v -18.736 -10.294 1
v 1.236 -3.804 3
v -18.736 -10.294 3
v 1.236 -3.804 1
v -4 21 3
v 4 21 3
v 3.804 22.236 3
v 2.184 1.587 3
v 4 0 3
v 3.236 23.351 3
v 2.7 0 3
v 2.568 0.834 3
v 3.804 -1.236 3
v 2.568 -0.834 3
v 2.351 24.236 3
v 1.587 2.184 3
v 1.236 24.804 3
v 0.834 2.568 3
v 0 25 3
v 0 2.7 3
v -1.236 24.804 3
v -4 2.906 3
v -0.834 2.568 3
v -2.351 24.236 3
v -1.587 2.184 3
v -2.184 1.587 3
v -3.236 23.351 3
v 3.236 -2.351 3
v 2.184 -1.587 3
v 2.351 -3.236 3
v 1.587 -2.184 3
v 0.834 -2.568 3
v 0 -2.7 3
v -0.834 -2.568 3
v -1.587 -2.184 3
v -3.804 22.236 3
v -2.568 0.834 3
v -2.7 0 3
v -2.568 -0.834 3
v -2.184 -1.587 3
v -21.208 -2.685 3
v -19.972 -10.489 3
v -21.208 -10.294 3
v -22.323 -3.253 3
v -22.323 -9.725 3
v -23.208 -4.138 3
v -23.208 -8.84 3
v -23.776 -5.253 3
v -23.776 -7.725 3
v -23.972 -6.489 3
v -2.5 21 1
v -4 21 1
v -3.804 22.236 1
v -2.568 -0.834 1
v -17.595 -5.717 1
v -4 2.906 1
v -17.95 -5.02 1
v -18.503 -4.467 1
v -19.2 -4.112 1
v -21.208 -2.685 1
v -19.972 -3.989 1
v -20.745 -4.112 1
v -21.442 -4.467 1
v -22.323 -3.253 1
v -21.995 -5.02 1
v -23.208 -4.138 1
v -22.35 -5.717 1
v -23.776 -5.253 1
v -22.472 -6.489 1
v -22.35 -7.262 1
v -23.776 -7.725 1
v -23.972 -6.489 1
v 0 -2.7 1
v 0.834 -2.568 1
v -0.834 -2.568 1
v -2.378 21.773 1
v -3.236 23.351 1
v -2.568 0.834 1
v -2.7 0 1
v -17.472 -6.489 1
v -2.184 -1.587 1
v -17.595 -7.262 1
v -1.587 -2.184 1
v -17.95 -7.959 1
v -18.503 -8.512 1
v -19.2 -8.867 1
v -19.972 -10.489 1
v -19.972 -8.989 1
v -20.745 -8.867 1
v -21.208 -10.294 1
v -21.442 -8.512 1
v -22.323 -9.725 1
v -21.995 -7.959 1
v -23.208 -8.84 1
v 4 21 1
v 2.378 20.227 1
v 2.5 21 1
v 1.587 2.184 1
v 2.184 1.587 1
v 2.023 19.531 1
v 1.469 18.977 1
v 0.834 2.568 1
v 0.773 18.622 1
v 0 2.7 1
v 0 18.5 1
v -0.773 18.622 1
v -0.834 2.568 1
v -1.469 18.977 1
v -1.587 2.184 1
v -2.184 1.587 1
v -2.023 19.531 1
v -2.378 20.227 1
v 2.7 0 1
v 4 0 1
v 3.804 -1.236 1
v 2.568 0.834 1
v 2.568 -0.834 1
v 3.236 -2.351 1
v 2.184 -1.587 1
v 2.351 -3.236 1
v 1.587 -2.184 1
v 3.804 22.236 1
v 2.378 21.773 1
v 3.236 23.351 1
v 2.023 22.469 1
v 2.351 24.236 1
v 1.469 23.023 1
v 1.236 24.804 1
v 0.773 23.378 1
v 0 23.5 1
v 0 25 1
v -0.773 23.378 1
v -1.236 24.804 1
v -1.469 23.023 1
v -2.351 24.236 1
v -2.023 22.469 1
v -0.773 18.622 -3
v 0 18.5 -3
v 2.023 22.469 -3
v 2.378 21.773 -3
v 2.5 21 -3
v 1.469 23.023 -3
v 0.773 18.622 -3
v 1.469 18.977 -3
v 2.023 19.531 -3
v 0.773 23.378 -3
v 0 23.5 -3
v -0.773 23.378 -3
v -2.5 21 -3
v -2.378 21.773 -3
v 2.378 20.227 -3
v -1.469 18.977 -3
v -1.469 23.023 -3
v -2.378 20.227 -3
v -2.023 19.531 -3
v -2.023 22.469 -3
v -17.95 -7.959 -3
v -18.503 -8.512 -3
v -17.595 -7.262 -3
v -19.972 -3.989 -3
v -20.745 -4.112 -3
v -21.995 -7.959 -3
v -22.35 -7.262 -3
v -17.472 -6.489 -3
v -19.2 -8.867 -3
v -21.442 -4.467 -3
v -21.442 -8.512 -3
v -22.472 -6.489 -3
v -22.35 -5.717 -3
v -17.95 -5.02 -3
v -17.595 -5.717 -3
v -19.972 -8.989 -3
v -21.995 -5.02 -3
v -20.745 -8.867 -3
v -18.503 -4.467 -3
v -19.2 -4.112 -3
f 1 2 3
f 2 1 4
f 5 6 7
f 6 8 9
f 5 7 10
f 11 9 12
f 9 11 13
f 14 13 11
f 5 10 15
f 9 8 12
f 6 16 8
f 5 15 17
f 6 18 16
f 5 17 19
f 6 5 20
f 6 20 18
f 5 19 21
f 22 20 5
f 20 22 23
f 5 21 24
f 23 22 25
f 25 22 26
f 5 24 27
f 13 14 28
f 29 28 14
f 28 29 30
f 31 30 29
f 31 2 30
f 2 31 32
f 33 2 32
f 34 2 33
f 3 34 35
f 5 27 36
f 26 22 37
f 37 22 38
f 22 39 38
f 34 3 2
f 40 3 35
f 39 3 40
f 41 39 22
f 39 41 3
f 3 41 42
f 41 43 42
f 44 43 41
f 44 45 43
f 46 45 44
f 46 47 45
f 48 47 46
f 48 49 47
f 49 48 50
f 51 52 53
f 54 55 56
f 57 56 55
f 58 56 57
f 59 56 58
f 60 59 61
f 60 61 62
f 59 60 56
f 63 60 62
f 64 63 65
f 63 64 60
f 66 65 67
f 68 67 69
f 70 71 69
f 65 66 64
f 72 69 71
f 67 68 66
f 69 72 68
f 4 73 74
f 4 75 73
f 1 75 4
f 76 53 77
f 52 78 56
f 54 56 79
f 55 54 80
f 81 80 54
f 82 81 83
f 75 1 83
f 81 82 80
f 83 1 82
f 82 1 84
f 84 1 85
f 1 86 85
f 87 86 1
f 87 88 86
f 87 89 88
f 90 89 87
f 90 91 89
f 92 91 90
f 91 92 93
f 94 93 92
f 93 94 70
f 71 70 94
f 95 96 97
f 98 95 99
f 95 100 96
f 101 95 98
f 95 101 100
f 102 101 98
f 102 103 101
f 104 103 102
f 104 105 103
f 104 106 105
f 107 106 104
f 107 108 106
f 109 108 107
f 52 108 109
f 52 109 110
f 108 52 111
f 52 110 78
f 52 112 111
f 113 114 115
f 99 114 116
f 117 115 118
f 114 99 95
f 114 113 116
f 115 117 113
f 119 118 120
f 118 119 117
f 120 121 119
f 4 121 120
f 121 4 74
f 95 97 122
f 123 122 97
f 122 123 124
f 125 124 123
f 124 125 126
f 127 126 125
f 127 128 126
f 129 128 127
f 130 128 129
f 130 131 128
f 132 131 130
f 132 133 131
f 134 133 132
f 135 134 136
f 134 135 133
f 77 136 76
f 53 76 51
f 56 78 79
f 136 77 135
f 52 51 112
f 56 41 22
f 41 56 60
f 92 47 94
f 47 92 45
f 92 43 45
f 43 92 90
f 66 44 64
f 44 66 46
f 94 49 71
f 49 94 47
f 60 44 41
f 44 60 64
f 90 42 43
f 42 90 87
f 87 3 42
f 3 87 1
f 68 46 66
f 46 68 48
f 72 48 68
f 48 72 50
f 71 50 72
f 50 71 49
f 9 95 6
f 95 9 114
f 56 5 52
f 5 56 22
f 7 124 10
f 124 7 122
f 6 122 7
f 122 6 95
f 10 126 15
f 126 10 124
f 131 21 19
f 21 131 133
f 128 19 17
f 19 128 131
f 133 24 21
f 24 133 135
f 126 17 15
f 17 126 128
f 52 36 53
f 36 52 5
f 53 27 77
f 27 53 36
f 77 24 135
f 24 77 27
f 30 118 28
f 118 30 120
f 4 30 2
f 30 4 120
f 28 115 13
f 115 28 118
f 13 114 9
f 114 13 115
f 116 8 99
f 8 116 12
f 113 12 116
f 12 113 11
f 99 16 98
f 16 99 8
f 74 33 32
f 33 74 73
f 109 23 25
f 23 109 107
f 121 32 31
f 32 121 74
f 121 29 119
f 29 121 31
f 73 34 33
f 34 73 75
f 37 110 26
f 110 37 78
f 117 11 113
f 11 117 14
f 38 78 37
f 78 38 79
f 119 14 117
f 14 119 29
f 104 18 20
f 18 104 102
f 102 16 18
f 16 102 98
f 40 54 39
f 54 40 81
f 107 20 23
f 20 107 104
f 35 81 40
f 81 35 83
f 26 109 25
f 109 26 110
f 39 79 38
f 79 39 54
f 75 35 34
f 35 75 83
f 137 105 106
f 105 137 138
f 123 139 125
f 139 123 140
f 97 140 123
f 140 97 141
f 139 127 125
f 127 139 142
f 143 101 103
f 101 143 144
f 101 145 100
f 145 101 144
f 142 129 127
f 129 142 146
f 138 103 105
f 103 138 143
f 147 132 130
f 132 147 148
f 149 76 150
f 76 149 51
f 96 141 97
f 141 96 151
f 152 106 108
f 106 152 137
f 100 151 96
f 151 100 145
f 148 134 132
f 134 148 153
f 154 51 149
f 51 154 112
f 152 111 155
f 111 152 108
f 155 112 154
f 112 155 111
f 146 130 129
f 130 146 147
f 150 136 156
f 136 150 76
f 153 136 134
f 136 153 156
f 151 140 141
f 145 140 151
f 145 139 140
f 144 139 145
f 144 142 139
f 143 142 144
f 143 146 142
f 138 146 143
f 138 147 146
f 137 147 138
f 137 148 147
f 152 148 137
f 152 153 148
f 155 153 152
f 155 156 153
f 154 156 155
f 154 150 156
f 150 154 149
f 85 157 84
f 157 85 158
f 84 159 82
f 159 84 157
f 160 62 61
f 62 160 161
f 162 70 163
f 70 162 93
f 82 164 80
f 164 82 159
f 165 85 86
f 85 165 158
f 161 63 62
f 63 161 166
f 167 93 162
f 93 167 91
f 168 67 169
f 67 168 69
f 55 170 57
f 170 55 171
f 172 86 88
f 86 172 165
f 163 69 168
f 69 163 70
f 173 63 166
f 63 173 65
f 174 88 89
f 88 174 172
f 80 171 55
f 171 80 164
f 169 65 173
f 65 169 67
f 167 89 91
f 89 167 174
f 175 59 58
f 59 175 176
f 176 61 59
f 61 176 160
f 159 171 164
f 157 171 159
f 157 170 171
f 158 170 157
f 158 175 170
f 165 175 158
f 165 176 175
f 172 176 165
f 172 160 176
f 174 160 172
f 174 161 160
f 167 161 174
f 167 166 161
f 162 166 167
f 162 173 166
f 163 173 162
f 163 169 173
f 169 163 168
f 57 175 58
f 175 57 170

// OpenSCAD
use <MCAD/regular_shapes.scad>

$fn = 20;

w = 8;
h = 2;
l = 50;

axil_r = 2.5;

tol = 0.2;

small_tol = 0.1;
cap_t = 1;

module cap() {
    cylinder_tube(h, axil_r + small_tol + cap_t, cap_t, center=true);
}

num_sects = 5;
alpha = 360/num_sects;

male = false;
if (male) {
    translate([0, 0, h * 3/2]) cylinder(h * 2, axil_r, axil_r, center=true);
    //translate([0, 0, 2*h]) cap();
    difference(){
        union(){
            translate([(l-w)/4, 0, 0]) cube([(l-w)/2, w, h], center=true);
            translate([(l-w)/2, 0, 0]) cylinder(h, w/2, w/2, center=true);
            cylinder(h, w/2, w/2, center=true);
            rotate(alpha){
                translate([-(l-w)/4, 0, 0]) cube([(l-w)/2, w, h], center=true);
                translate([-(l-w)/2, 0, 0]) cylinder(h, w/2, w/2, center=true);
            }
        }
        translate([l/2 - w/2, 0, 0]) cylinder(h * 2, axil_r + tol, axil_r + tol, center=true);
        rotate(alpha) translate([w/2 - l/2, 0, 0]) cylinder(h * 2, axil_r + tol, axil_r + tol, center=true);
    }
}

if (true) {
    translate([0, 0, h])
    difference(){
        union(){
            translate([0, (l-w)/4, 0]) cube([w, (l - w)/2, h], center=true);
            translate([0, (l-w)/2, 0]) cylinder(h, w/2, w/2, center=true);
            cylinder(h, w/2, w/2, center=true);
            rotate(-alpha){
                translate([0, -(l-w)/4, 0]) cube([w, (l - w)/2, h], center=true);
                translate([0, -(l-w)/2, 0]) cylinder(h, w/2, w/2, center=true);
            }
        }
        cylinder(h * 2, axil_r + tol, axil_r + tol, center=true);
    }
    translate([0, l/2 - w/2, -h * 1/2]) cylinder(h * 2, axil_r, axil_r, center=true);
    rotate(-alpha) translate([0, w/2 - l/2, -h * 1/2]) cylinder(h * 2, axil_r, axil_r, center=true);
}

//cap();
